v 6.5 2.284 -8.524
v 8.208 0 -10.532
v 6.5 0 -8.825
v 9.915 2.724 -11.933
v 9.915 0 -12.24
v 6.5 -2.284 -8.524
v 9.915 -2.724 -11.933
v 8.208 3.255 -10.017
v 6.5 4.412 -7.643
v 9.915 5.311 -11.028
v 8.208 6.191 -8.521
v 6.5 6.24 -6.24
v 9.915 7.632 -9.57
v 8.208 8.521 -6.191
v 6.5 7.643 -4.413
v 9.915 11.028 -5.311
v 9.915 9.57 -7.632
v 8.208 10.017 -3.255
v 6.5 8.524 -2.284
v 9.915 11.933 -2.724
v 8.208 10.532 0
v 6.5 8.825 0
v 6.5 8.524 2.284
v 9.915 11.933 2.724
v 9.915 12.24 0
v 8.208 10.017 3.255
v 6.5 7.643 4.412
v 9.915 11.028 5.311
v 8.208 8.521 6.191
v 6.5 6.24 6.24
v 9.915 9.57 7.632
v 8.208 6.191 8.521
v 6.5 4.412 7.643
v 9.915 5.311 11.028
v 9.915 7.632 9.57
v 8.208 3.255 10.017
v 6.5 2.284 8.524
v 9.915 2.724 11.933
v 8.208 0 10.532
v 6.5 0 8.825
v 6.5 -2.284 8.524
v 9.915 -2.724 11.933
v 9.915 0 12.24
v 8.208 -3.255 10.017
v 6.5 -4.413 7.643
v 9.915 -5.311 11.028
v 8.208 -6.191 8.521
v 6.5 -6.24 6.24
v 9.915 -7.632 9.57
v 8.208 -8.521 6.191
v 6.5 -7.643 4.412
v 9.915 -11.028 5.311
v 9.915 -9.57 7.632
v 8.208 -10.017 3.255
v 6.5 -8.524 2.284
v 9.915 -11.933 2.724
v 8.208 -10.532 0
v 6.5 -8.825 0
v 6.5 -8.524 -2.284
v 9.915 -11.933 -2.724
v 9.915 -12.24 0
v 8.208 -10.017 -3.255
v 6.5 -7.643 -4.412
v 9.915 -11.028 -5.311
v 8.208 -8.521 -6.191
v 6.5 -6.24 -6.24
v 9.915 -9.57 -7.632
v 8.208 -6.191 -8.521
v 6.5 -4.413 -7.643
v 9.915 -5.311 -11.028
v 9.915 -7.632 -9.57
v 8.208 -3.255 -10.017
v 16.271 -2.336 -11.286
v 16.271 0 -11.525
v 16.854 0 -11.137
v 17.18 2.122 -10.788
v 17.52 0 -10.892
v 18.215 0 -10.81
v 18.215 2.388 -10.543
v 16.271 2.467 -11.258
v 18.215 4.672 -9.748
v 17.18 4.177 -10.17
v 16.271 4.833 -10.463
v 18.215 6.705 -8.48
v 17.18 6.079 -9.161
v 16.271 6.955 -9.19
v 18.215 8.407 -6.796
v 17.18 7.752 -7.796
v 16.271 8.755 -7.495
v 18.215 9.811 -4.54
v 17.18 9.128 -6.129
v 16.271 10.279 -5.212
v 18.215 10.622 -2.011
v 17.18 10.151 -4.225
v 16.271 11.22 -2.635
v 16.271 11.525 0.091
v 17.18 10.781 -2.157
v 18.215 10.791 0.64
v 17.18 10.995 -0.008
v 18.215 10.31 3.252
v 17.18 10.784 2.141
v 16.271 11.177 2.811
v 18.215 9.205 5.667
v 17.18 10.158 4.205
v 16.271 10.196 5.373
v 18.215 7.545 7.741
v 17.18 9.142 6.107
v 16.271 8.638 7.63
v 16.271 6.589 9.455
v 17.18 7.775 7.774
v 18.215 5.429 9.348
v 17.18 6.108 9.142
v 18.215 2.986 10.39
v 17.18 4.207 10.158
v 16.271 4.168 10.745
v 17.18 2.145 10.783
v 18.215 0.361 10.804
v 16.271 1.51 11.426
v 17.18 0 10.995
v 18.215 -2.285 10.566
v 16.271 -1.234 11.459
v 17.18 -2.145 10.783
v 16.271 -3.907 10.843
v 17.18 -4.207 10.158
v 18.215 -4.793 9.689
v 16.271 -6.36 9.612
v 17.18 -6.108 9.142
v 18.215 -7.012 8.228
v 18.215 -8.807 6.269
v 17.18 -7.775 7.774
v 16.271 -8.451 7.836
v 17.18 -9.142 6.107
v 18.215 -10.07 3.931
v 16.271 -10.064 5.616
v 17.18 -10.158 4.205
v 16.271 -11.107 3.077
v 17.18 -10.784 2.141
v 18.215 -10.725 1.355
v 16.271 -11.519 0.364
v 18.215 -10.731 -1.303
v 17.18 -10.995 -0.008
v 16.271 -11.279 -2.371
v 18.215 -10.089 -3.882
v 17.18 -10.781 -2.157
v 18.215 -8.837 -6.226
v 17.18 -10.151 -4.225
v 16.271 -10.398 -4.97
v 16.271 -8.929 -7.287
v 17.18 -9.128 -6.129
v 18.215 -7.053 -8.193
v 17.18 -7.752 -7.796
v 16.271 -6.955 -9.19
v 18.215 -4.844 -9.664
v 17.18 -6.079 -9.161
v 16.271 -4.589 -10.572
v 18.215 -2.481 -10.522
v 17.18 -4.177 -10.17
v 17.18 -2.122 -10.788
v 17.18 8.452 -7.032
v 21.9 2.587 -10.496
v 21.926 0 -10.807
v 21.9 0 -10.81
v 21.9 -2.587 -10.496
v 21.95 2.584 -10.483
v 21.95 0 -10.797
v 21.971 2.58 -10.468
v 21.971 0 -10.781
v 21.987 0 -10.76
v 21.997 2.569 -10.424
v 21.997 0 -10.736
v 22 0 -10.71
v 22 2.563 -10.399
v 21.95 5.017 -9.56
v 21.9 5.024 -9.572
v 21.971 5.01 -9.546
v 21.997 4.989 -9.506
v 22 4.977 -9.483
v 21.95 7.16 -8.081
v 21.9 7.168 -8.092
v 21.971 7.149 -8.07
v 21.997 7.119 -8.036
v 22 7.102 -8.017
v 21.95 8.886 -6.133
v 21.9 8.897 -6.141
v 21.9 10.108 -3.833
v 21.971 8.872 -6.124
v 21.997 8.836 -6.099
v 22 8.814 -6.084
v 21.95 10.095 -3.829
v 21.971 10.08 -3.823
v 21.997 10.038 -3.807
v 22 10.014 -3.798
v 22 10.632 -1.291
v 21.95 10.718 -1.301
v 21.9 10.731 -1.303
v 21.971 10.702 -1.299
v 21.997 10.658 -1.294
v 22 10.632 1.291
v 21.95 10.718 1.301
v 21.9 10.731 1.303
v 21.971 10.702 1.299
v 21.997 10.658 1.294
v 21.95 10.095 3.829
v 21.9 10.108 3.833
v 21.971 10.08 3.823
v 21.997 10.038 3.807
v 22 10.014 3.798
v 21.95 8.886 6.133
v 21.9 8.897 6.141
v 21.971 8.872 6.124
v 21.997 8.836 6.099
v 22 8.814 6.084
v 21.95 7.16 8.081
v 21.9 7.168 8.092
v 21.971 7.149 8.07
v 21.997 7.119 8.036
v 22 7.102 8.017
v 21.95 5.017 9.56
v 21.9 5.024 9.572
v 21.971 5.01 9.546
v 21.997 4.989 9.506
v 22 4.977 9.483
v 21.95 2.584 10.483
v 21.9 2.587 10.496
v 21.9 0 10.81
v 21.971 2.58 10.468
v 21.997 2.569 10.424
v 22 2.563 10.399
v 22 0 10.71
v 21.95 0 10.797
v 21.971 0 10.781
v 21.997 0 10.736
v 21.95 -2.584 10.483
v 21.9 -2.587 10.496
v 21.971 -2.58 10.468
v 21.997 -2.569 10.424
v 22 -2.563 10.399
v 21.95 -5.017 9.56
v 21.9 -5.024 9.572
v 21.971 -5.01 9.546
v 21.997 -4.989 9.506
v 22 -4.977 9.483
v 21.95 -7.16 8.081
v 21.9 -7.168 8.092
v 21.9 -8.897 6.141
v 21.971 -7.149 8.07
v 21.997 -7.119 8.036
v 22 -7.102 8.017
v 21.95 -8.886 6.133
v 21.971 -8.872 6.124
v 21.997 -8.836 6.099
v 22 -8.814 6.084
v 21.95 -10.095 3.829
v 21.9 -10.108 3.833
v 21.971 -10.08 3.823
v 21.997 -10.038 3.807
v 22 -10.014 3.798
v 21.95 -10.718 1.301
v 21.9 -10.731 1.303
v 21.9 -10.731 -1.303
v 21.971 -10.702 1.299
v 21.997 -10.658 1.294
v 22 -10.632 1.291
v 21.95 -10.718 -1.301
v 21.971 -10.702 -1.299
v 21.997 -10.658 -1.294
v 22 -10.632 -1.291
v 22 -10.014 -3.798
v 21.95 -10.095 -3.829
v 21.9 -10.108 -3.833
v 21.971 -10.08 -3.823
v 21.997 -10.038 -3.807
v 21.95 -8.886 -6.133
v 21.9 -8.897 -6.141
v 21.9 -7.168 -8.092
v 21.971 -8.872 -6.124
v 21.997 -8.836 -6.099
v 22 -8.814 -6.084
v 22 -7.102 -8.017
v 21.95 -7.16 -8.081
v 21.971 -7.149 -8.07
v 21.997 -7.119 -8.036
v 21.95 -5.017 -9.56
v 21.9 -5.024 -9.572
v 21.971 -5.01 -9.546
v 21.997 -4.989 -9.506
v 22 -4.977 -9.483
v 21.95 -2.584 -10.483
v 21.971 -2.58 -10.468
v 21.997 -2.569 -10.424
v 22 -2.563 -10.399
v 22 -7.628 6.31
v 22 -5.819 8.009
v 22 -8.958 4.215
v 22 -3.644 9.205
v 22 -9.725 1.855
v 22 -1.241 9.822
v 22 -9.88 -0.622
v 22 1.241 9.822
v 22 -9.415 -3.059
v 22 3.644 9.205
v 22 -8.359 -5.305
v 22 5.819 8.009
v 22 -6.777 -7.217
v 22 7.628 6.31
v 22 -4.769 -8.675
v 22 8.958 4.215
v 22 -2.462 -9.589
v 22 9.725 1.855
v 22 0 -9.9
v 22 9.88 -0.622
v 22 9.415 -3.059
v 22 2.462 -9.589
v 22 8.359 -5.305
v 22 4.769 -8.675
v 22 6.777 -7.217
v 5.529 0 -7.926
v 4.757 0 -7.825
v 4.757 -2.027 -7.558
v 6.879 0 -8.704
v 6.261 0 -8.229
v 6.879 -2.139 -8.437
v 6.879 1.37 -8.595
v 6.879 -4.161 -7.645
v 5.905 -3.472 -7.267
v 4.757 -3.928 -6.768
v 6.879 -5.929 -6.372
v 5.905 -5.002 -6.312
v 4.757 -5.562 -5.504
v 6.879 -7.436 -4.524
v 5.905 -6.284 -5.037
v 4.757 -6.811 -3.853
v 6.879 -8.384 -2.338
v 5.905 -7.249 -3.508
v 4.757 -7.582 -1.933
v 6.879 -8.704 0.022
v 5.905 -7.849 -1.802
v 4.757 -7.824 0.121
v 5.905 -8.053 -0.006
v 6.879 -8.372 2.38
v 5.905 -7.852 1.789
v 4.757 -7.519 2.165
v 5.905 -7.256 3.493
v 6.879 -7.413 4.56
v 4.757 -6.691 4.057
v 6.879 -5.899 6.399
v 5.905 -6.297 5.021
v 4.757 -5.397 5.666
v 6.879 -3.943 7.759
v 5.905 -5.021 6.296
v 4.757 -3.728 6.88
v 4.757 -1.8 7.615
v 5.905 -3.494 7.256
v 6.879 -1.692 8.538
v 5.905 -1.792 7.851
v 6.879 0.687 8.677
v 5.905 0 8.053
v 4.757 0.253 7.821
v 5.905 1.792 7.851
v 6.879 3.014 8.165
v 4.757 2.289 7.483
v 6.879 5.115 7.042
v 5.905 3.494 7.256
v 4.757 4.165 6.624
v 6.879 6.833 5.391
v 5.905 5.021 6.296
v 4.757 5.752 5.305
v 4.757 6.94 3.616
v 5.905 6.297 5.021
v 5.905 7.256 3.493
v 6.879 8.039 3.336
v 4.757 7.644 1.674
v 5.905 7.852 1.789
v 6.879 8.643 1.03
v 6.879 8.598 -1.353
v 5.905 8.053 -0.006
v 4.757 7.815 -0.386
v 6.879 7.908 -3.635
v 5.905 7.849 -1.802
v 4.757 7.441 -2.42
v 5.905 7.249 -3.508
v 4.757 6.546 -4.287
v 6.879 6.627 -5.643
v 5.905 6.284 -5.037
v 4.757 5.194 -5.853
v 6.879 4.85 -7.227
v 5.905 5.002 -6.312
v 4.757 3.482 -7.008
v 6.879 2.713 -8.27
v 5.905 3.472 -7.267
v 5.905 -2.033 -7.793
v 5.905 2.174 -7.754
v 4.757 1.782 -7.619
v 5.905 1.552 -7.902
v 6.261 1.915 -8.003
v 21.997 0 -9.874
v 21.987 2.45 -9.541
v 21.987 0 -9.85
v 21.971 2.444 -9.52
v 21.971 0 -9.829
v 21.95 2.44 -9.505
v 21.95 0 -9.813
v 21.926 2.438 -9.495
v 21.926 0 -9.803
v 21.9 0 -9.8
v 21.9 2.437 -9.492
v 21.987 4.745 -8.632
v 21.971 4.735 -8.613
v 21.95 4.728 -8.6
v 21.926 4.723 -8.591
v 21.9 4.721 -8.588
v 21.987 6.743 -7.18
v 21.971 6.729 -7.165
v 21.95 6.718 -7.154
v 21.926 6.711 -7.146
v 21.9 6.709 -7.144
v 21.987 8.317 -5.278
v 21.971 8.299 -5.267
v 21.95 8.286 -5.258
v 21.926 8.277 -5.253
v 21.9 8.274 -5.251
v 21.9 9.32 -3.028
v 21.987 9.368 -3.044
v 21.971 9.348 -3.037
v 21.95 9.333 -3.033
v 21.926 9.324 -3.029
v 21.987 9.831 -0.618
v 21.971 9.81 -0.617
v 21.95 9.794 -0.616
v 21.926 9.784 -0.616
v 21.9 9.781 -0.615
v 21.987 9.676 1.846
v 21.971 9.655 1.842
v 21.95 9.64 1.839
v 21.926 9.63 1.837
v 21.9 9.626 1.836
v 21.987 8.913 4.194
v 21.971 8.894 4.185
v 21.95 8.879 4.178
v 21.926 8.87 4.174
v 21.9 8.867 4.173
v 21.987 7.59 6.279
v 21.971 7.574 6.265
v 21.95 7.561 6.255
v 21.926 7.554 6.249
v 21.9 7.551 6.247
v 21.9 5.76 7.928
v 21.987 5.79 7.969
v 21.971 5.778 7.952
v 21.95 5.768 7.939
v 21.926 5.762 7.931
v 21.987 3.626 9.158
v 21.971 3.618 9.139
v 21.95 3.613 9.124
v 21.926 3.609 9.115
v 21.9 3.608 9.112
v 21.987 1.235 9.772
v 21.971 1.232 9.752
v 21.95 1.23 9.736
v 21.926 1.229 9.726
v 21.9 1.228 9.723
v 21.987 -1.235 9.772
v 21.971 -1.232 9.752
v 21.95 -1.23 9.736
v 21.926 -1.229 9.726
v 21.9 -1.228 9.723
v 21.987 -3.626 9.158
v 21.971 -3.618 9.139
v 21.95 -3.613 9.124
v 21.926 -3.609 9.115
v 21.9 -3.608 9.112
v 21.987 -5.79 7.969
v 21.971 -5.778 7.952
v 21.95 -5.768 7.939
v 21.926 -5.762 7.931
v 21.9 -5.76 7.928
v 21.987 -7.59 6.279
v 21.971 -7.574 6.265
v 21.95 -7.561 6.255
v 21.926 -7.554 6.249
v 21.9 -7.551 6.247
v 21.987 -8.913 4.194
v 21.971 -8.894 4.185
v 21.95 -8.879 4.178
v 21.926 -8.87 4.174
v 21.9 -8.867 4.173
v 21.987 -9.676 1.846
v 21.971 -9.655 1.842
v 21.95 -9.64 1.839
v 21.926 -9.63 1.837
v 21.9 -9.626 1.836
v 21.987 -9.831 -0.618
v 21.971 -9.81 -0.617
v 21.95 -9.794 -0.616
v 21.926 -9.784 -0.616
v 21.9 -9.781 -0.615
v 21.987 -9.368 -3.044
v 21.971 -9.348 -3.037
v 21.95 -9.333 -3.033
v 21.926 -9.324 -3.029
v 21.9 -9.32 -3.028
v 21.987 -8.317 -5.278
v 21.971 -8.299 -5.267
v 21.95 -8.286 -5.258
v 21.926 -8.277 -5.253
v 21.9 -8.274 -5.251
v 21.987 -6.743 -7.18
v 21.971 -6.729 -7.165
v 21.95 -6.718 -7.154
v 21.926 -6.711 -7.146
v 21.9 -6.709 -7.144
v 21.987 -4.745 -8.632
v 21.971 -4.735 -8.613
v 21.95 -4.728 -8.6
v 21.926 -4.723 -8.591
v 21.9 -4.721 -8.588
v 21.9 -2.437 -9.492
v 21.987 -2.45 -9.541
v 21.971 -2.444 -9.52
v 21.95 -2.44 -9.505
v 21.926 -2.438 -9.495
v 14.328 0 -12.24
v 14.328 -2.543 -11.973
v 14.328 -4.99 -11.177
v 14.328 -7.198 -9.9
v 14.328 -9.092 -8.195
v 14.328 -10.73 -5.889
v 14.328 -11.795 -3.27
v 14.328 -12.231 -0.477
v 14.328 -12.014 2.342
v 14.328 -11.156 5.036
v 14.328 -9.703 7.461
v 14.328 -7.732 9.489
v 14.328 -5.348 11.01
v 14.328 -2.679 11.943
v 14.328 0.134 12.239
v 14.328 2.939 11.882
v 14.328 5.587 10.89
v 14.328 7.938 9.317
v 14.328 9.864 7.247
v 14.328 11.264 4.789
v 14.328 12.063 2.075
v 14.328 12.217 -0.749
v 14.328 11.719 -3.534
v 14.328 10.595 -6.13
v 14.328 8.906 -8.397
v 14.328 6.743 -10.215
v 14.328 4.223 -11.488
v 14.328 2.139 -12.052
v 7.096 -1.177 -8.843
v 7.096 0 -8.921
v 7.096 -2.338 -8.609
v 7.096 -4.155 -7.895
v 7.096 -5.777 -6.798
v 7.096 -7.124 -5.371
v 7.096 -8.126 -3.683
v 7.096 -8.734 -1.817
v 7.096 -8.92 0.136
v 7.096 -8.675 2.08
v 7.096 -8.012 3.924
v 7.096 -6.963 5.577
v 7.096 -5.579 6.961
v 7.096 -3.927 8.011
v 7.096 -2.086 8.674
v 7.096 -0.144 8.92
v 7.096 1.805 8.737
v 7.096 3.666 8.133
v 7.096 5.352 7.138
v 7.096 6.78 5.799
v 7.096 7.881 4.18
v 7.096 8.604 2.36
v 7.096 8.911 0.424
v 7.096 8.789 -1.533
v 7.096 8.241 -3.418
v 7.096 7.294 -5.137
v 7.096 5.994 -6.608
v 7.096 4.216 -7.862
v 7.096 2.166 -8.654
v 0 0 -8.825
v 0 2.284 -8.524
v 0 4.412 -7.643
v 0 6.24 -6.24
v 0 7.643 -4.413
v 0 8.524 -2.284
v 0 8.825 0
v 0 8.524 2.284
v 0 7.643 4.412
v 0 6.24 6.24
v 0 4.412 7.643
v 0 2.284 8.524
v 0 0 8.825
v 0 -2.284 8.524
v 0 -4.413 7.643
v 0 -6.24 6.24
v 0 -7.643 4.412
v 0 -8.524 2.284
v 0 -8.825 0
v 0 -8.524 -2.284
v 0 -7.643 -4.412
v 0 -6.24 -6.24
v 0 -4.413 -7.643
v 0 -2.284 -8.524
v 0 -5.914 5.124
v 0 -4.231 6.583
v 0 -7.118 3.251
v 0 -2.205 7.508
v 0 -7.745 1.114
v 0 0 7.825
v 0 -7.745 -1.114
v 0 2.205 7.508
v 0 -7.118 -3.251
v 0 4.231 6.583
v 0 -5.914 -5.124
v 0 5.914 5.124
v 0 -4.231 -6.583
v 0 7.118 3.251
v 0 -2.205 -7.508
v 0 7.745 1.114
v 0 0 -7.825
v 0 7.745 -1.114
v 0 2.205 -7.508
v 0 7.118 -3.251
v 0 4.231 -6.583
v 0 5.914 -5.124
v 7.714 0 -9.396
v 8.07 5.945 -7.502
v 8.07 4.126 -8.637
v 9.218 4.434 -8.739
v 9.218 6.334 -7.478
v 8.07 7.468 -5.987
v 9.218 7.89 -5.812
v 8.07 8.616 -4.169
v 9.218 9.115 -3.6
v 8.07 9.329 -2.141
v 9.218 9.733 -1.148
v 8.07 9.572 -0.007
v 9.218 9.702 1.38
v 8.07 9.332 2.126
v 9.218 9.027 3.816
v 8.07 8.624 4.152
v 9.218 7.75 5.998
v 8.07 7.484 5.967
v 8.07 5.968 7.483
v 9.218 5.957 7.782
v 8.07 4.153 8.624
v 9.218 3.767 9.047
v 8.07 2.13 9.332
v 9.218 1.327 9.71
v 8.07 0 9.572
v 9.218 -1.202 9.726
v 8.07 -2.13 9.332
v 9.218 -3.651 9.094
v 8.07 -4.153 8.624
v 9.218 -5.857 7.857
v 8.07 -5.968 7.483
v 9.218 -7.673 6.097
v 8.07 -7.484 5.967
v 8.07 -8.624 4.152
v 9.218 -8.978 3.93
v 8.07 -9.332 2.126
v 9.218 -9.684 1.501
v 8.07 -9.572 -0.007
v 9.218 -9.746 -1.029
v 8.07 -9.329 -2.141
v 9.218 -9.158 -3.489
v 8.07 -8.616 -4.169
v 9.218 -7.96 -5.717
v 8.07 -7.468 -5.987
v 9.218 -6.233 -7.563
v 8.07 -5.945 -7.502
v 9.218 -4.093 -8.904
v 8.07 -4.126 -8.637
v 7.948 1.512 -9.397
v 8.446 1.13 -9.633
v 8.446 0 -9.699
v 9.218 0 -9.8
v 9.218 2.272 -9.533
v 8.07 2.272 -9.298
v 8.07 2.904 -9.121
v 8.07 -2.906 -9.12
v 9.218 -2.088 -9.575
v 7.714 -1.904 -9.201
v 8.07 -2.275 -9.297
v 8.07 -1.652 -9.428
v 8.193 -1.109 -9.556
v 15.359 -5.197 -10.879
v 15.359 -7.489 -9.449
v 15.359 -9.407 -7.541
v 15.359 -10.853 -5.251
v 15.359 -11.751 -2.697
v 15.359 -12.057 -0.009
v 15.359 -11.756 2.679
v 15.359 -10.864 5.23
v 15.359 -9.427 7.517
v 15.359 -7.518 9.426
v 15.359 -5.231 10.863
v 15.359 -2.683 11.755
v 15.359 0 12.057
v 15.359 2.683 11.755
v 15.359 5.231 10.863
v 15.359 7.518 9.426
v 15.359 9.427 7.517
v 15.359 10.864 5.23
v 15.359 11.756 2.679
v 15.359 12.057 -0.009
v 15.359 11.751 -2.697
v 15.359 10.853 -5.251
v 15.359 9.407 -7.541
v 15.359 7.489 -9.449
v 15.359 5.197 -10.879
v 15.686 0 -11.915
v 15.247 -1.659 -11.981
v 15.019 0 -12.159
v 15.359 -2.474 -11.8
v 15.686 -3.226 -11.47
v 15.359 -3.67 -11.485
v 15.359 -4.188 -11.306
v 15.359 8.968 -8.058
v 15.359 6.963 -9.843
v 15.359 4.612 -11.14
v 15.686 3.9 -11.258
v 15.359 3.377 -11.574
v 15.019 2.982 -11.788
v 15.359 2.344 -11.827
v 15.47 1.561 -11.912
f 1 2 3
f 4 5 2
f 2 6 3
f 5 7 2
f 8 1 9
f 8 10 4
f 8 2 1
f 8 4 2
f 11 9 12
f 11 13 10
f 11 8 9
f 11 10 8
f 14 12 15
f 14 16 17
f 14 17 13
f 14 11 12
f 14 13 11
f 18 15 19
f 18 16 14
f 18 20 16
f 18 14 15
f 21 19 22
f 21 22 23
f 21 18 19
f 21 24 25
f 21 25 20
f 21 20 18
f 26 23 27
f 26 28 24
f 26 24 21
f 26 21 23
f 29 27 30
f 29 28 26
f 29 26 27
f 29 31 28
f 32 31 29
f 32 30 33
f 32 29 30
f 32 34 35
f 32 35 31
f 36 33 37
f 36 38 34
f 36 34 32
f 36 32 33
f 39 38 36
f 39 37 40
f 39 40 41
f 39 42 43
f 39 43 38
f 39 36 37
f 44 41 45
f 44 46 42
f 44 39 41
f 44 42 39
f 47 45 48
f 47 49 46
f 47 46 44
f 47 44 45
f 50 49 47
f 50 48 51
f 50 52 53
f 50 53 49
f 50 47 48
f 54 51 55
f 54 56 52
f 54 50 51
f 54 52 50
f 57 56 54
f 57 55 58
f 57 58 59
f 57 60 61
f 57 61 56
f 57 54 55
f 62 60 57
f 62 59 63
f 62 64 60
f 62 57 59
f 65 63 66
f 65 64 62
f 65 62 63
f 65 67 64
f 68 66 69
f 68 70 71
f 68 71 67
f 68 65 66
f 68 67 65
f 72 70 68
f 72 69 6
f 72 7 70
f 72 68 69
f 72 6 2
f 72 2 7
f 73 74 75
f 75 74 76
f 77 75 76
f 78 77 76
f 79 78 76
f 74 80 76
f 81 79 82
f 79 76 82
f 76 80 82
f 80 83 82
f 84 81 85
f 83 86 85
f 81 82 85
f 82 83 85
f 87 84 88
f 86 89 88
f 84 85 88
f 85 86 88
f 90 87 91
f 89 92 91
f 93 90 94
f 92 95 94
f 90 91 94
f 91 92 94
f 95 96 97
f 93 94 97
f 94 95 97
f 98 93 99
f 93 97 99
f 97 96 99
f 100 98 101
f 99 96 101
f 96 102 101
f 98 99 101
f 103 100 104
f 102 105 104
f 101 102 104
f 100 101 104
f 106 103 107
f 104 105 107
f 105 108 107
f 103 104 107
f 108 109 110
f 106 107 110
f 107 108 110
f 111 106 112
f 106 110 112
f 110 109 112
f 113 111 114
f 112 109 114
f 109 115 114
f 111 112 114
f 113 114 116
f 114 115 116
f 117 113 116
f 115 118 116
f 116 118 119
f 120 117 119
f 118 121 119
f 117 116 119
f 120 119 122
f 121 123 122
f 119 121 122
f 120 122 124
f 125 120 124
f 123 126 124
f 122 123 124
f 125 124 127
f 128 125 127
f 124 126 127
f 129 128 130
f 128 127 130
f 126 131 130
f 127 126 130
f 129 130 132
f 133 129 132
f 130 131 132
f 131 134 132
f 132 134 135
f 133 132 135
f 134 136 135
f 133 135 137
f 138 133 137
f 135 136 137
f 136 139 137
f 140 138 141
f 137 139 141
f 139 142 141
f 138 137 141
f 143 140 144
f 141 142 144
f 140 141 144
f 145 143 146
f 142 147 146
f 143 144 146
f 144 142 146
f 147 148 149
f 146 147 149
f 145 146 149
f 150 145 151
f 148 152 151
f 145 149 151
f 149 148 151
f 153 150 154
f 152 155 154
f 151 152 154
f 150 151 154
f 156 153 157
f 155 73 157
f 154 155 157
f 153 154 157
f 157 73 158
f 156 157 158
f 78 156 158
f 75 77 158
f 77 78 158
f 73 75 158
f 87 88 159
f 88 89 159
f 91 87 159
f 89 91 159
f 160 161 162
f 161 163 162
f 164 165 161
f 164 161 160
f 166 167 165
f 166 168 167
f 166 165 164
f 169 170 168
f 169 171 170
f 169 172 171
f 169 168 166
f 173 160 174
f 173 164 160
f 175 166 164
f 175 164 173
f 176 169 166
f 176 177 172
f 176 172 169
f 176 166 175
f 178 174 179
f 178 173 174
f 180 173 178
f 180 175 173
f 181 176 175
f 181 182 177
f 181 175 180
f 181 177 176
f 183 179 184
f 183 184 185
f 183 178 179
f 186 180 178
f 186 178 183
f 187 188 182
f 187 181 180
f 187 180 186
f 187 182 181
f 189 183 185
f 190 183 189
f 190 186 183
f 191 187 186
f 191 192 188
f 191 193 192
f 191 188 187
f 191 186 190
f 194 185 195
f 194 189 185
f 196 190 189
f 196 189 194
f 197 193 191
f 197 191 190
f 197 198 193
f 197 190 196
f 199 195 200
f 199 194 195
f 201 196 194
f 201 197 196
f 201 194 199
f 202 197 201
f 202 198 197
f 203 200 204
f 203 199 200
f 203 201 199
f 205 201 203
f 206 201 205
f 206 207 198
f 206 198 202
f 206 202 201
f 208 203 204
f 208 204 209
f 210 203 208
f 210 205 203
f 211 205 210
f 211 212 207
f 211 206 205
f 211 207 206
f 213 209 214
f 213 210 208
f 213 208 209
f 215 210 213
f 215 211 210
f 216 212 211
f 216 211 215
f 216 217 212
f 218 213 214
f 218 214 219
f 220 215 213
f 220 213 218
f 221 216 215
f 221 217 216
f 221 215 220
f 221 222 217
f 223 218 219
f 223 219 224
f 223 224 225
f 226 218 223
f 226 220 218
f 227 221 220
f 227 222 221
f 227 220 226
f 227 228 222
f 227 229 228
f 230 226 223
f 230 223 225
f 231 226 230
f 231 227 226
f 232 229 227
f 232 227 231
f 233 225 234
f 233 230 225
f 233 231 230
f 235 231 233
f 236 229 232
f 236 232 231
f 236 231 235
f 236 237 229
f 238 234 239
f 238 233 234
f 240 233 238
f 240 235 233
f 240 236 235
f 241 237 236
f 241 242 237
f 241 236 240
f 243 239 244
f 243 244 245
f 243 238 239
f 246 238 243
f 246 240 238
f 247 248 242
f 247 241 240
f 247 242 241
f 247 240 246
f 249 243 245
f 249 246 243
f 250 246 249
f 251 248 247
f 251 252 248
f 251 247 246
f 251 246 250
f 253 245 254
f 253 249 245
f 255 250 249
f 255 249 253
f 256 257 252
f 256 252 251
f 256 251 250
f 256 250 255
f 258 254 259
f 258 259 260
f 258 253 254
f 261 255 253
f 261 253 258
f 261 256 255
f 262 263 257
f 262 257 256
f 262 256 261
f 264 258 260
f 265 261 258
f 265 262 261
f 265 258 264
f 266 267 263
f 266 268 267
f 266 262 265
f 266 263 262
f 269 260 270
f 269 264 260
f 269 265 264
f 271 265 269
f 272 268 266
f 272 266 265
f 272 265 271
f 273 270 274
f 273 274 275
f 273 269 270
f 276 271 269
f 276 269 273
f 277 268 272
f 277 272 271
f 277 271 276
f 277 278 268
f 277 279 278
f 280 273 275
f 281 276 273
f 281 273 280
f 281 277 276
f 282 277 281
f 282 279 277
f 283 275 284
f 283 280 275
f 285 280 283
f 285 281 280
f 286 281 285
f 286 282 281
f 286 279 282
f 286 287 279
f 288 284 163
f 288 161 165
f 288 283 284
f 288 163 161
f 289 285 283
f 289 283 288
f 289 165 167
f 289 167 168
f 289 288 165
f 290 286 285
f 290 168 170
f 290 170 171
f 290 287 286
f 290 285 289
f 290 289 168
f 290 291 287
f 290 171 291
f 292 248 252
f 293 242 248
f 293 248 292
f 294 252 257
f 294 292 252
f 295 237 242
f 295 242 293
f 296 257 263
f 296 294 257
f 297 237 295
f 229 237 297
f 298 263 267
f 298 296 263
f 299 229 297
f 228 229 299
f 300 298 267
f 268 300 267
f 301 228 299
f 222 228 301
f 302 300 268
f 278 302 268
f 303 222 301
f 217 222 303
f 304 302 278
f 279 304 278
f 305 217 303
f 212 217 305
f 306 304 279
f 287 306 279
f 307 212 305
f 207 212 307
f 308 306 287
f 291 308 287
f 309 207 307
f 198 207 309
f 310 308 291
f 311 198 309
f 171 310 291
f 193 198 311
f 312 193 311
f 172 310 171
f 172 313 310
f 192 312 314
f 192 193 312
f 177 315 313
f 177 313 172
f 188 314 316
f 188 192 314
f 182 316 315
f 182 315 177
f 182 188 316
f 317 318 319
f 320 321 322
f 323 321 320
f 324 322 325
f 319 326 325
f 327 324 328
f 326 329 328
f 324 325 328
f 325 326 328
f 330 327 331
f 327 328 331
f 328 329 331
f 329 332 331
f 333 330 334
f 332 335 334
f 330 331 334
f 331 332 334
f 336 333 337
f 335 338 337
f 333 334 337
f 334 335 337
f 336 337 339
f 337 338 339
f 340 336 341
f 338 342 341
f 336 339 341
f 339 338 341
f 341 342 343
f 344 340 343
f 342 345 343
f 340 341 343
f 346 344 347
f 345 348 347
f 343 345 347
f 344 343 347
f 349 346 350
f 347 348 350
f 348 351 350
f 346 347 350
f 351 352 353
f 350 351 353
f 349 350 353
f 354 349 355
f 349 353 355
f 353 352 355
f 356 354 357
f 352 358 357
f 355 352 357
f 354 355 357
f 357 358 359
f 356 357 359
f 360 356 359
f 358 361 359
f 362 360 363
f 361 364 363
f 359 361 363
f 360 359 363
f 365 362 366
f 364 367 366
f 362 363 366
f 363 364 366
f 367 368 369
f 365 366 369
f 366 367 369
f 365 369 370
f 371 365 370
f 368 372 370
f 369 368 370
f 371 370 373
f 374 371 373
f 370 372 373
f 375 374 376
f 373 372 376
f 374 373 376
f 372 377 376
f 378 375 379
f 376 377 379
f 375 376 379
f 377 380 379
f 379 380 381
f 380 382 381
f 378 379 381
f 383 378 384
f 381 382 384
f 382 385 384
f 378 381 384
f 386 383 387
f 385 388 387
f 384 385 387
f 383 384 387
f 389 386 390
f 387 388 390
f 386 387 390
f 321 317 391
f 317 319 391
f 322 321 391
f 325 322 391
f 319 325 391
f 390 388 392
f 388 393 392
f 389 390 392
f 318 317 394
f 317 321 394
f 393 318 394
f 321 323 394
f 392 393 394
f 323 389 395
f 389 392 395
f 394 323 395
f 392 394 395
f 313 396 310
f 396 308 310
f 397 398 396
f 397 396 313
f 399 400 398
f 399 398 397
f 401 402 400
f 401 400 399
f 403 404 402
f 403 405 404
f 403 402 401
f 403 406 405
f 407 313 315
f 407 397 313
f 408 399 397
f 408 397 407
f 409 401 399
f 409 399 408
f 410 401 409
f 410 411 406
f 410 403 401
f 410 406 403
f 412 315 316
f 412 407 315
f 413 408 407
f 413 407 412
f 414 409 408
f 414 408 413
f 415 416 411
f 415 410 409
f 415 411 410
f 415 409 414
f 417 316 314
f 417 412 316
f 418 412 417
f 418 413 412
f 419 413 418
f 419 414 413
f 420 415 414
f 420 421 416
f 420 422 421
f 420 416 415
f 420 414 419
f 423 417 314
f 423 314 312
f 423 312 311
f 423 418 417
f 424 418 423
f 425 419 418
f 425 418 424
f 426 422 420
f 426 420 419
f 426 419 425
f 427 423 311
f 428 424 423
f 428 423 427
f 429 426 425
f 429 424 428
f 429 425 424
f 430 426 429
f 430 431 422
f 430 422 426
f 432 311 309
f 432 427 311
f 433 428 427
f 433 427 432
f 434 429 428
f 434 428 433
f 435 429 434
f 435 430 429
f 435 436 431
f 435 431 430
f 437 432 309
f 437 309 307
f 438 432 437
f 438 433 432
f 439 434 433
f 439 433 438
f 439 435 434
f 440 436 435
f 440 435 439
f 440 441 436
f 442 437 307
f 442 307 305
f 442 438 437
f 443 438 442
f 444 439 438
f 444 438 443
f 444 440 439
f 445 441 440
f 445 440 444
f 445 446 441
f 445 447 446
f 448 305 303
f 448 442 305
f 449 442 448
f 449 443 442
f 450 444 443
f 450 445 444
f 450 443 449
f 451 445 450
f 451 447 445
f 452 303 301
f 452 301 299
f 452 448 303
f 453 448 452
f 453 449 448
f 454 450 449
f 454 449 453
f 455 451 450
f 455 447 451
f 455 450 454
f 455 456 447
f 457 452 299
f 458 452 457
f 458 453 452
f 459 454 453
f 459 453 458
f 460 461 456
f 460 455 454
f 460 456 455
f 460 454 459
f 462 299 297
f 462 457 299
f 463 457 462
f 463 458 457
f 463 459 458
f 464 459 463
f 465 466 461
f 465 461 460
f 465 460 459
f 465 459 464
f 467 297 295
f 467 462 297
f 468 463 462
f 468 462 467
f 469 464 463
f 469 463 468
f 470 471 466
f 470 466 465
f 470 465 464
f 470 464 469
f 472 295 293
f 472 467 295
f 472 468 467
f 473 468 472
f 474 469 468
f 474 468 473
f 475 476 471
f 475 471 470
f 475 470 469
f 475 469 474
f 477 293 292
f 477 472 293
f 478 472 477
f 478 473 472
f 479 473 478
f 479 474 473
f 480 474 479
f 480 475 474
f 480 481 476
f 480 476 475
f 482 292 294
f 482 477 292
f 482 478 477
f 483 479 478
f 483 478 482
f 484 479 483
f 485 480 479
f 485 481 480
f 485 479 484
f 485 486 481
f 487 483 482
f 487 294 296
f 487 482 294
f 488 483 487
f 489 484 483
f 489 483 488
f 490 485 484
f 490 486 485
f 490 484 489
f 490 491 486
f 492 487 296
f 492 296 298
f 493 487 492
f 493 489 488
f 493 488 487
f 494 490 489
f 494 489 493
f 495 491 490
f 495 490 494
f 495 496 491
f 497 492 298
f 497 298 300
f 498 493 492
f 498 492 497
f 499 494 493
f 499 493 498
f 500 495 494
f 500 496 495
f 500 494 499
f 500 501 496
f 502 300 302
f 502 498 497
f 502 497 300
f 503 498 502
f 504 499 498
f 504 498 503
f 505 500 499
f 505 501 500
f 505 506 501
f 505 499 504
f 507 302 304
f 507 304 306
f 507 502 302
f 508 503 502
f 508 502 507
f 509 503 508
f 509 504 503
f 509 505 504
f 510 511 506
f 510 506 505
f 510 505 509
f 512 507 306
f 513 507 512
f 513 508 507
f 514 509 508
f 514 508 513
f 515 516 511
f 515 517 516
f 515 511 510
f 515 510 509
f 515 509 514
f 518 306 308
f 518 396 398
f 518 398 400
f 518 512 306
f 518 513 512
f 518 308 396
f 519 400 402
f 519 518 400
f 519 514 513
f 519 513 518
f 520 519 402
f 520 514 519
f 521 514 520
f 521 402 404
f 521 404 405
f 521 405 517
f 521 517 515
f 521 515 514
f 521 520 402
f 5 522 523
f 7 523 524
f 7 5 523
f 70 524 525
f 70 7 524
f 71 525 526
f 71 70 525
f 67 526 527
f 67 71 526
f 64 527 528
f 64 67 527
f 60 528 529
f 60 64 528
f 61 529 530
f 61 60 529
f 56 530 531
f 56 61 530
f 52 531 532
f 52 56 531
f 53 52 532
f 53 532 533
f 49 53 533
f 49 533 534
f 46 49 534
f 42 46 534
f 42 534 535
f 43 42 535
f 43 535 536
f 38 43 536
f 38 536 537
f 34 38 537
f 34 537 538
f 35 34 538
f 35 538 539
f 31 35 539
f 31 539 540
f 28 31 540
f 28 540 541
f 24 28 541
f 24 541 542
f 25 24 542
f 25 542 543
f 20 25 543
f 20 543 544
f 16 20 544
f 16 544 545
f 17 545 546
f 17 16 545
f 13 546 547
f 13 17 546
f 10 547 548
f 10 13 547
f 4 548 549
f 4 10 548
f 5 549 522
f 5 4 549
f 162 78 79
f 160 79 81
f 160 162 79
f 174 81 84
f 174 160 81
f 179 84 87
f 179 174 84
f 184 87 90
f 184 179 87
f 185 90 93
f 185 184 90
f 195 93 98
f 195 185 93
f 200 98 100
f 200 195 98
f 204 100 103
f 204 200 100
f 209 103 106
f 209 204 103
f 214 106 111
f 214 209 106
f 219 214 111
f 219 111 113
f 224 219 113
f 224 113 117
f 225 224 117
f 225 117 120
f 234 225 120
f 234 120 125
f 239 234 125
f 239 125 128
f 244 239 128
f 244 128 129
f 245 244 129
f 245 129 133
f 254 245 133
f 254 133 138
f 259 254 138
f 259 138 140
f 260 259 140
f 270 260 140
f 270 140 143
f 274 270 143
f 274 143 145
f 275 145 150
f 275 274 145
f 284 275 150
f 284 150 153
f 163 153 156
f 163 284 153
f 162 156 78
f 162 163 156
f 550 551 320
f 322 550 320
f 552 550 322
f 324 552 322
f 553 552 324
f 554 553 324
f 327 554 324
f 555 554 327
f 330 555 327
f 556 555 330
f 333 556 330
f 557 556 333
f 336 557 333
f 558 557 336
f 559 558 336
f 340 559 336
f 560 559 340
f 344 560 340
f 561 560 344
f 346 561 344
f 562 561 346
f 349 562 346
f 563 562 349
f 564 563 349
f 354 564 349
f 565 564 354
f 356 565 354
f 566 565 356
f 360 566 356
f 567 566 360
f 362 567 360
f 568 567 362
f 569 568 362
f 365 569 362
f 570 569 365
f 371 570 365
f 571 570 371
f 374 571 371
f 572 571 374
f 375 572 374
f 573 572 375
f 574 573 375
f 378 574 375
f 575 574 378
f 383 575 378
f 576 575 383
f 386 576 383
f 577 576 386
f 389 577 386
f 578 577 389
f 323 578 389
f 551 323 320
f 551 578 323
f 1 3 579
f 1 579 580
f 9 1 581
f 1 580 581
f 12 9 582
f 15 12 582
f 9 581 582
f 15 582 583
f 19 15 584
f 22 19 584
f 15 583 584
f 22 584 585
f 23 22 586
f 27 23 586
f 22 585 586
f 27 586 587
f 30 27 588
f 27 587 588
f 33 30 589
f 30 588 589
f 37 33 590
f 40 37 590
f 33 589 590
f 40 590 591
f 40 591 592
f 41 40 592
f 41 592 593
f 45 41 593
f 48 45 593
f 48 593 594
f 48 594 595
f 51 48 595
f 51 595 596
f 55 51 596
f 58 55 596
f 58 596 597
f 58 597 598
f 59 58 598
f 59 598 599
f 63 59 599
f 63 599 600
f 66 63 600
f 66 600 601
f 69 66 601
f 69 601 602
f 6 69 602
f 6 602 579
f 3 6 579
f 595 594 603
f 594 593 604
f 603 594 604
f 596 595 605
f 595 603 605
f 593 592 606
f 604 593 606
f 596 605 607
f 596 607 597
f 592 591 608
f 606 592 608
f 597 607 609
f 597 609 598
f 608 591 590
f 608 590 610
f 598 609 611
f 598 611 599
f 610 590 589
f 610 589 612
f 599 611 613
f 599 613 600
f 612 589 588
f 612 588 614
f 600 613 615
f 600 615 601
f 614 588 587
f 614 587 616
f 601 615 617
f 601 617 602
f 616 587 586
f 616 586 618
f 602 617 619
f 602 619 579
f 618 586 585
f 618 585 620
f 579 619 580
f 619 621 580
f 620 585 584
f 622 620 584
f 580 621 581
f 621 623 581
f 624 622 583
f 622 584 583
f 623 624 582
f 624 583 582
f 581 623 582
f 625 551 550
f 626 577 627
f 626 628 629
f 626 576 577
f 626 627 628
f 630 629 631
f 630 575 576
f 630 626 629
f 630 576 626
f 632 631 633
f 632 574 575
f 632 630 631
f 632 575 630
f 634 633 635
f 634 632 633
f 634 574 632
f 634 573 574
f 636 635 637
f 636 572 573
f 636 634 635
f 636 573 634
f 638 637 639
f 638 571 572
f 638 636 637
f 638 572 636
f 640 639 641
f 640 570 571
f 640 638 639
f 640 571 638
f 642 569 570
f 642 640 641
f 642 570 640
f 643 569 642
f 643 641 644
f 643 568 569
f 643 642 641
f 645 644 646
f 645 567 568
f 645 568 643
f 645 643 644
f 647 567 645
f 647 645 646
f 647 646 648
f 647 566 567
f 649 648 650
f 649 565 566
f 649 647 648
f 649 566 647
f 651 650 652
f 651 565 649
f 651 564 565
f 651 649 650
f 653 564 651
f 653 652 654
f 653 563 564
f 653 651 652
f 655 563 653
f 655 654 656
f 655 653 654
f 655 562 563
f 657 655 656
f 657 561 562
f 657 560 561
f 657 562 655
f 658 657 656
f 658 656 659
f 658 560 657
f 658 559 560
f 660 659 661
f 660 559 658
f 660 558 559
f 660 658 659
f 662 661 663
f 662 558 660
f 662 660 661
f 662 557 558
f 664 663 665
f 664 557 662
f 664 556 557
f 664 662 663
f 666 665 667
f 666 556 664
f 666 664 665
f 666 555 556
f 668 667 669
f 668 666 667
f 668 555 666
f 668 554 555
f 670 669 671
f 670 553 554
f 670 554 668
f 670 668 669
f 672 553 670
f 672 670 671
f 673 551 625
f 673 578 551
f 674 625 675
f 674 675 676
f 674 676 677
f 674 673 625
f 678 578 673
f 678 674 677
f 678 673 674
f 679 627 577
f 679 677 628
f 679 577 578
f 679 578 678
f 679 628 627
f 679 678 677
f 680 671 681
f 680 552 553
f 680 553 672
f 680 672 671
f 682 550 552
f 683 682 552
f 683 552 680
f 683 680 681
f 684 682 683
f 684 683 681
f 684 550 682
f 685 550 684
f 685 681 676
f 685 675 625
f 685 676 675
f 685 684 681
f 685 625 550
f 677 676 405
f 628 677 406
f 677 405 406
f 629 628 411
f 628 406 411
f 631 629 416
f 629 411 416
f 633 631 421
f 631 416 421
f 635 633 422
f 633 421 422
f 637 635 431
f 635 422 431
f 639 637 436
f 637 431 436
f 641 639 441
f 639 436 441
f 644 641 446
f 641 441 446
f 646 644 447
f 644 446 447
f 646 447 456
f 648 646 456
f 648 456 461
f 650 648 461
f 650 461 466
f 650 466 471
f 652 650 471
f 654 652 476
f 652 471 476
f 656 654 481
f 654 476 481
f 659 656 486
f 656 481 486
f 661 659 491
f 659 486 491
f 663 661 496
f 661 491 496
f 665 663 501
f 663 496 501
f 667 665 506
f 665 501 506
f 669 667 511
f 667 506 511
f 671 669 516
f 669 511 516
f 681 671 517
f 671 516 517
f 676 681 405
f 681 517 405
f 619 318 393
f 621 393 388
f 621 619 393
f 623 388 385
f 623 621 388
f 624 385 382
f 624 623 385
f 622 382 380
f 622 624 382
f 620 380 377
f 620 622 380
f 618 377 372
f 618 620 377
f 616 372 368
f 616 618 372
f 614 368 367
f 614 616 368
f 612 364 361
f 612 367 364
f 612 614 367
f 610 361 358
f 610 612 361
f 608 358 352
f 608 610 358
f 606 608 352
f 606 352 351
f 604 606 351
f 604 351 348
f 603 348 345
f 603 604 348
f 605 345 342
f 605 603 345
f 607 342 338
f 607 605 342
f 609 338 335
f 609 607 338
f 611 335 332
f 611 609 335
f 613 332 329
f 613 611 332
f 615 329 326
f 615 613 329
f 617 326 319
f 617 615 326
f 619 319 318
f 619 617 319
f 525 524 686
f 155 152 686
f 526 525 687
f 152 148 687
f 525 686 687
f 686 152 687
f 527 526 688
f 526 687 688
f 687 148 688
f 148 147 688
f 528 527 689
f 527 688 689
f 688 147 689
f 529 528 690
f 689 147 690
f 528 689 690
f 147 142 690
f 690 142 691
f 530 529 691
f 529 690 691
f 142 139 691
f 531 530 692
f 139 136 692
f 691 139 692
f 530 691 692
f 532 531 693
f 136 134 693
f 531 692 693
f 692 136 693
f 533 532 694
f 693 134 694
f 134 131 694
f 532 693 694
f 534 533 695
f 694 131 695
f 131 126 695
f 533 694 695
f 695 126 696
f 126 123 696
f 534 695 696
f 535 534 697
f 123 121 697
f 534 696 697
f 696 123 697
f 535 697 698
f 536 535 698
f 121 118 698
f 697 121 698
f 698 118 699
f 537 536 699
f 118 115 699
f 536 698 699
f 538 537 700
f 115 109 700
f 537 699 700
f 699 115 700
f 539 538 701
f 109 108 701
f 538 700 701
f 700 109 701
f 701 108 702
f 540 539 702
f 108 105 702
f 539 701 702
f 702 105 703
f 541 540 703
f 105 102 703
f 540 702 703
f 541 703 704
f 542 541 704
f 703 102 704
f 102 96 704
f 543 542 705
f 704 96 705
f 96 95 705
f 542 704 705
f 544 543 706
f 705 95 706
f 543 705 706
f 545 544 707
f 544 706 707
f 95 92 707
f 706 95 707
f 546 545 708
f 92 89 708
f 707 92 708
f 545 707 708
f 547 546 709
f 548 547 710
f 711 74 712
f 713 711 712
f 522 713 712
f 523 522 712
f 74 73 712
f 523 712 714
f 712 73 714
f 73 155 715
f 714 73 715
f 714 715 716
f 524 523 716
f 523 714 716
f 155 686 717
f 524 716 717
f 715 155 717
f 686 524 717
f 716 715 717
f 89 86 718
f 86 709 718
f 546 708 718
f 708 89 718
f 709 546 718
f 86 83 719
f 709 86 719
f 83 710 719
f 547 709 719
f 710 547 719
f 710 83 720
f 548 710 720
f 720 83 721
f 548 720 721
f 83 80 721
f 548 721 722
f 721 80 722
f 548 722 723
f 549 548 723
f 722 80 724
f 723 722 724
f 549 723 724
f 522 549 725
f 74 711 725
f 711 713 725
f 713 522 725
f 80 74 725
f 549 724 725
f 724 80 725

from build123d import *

# Parameters (mm, degrees)
SKETCH1_R           = 8.825
SKETCH1_R_2         = 7.825
BOSS_EXTRUDE1_DEPTH = 10
SKETCH2_R           = 12.24
SKETCH2_R_2         = 7.825
BOSS_EXTRUDE2_DEPTH = 12
CHAMFER1_SIZE       = 3.5
SKETCH3_R           = 9.8
CUT_EXTRUDE1_DEPTH  = 12
CHAMFER2_SIZE       = 4
FILLET1_R           = 3
SKETCH4_R           = 12.810143369
SKETCH4_R_2         = 10.810143369
CUT_EXTRUDE2_DEPTH  = 7
CHAMFER3_SIZE       = 2
FILLET2_R           = 3
FILLET3_R           = 3
FILLET4_R           = 0.1


with BuildPart() as part:
    # Sketch1 → Boss-Extrude1 (new body)
    with BuildSketch(Plane(origin=(0, 0, 0), x_dir=(0, 0, -1), z_dir=(1, 0, 0))):
        Circle(SKETCH1_R)
        Circle(SKETCH1_R_2, mode=Mode.SUBTRACT)
    extrude(amount=BOSS_EXTRUDE1_DEPTH)

    # Sketch2 → Boss-Extrude2 (add)
    with BuildSketch(Plane(origin=(10, 0, 0), x_dir=(0, 0, -1), z_dir=(1, 0, 0))):
        Circle(SKETCH2_R)
        Circle(SKETCH2_R_2, mode=Mode.SUBTRACT)
    extrude(amount=BOSS_EXTRUDE2_DEPTH)

    # Chamfer1
    # the kernel refuses this chamfer: 3.5 mm, written as the material it adds along each edge
    with BuildSketch(Plane(origin=(10, 0, 0), x_dir=(0, 0, -1), z_dir=(0, -1, 0))) as chamfer1_piece_1_section:
        Polygon((8.825, -CHAMFER1_SIZE), (8.825 + CHAMFER1_SIZE, 0), (8.825, 0), align=None)
    chamfer1_piece_1 = revolve(axis=Axis((10, 0, 0), (1, 0, 0)), mode=Mode.PRIVATE)
    chamfer1_piece_1 = chamfer1_piece_1 & Plane(origin=(8.210974628, 0, 0), x_dir=(0, 0, -1), z_dir=(-1, 0, 0)) * Cylinder(12.24, 50, mode=Mode.PRIVATE)
    add(chamfer1_piece_1)

    # Sketch3 → Cut-Extrude1 (cut)
    with BuildSketch(Plane(origin=(22, 0, 0), x_dir=(0, 0, -1), z_dir=(1, 0, 0))):
        Circle(SKETCH3_R)
    extrude(amount=-CUT_EXTRUDE1_DEPTH, mode=Mode.SUBTRACT)

    # Chamfer2
    # the kernel refuses this chamfer: 4 mm, written as the material it takes off along each edge
    with BuildSketch(Plane(origin=(10, 0, 0), x_dir=(0, 0, -1), z_dir=(0, 1, 0))) as chamfer2_piece_1_section:
        Polygon((7.825, CHAMFER2_SIZE), (7.825 + CHAMFER2_SIZE, 0), (7.825, 0), align=None)
    chamfer2_piece_1 = revolve(axis=Axis((10, 0, 0), (-1, 0, 0)), mode=Mode.PRIVATE)
    chamfer2_piece_1 = chamfer2_piece_1 & Plane(origin=(6.980894561, 0, 0), x_dir=(0, 0, -1), z_dir=(1, 0, 0)) * Cylinder(9.8, 48, mode=Mode.PRIVATE)
    add(chamfer2_piece_1, mode=Mode.SUBTRACT)

    # Fillet1
    fillet1_edges = [part.edges().sort_by_distance(p)[0] for p in [
        (6, 0, 7.825),
        (7.975, 0, 9.8),
    ]]
    fillet(fillet1_edges, radius=FILLET1_R)

    # Sketch4 → Cut-Extrude2 (cut)
    with BuildSketch(Plane(origin=(22, 0, 0), x_dir=(0, 0, -1), z_dir=(1, 0, 0))):
        Circle(SKETCH4_R)
        Circle(SKETCH4_R_2, mode=Mode.SUBTRACT)
    extrude(amount=-CUT_EXTRUDE2_DEPTH, mode=Mode.SUBTRACT)

    # Chamfer3
    # the kernel refuses this chamfer: 2 mm, written as the material it adds along each edge
    with BuildSketch(Plane(origin=(15, 0, 0), x_dir=(0, 0, -1), z_dir=(0, -1, 0))) as chamfer3_piece_1_section:
        Polygon((10.810143369 + CHAMFER3_SIZE, 0), (10.810143369, CHAMFER3_SIZE), (10.810143369, 0), align=None)
    chamfer3_piece_1 = revolve(axis=Axis((15, 0, 0), (1, 0, 0)), mode=Mode.PRIVATE)
    chamfer3_piece_1 = chamfer3_piece_1 & Plane(origin=(16.276433471, 0, 0), x_dir=(0, 0, -1), z_dir=(-1, 0, 0)) * Cylinder(12.24, 52, mode=Mode.PRIVATE)
    add(chamfer3_piece_1)

    # Fillet2
    fillet2_edges = [part.edges().sort_by_distance(p)[0] for p in [
        (15.570143369, 0, 12.24),
    ]]
    fillet(fillet2_edges, radius=FILLET2_R)

    # Fillet3
    fillet3_edges = [part.edges().sort_by_distance(p)[0] for p in [
        (17, 0, 10.810143369),
    ]]
    fillet(fillet3_edges, radius=FILLET3_R)

    # Fillet4
    fillet4_edges = [part.edges().sort_by_distance(p)[0] for p in [
        (22, 0, 9.8),
        (22, 0, 10.810143369),
    ]]
    fillet(fillet4_edges, radius=FILLET4_R)


solid = part.part
